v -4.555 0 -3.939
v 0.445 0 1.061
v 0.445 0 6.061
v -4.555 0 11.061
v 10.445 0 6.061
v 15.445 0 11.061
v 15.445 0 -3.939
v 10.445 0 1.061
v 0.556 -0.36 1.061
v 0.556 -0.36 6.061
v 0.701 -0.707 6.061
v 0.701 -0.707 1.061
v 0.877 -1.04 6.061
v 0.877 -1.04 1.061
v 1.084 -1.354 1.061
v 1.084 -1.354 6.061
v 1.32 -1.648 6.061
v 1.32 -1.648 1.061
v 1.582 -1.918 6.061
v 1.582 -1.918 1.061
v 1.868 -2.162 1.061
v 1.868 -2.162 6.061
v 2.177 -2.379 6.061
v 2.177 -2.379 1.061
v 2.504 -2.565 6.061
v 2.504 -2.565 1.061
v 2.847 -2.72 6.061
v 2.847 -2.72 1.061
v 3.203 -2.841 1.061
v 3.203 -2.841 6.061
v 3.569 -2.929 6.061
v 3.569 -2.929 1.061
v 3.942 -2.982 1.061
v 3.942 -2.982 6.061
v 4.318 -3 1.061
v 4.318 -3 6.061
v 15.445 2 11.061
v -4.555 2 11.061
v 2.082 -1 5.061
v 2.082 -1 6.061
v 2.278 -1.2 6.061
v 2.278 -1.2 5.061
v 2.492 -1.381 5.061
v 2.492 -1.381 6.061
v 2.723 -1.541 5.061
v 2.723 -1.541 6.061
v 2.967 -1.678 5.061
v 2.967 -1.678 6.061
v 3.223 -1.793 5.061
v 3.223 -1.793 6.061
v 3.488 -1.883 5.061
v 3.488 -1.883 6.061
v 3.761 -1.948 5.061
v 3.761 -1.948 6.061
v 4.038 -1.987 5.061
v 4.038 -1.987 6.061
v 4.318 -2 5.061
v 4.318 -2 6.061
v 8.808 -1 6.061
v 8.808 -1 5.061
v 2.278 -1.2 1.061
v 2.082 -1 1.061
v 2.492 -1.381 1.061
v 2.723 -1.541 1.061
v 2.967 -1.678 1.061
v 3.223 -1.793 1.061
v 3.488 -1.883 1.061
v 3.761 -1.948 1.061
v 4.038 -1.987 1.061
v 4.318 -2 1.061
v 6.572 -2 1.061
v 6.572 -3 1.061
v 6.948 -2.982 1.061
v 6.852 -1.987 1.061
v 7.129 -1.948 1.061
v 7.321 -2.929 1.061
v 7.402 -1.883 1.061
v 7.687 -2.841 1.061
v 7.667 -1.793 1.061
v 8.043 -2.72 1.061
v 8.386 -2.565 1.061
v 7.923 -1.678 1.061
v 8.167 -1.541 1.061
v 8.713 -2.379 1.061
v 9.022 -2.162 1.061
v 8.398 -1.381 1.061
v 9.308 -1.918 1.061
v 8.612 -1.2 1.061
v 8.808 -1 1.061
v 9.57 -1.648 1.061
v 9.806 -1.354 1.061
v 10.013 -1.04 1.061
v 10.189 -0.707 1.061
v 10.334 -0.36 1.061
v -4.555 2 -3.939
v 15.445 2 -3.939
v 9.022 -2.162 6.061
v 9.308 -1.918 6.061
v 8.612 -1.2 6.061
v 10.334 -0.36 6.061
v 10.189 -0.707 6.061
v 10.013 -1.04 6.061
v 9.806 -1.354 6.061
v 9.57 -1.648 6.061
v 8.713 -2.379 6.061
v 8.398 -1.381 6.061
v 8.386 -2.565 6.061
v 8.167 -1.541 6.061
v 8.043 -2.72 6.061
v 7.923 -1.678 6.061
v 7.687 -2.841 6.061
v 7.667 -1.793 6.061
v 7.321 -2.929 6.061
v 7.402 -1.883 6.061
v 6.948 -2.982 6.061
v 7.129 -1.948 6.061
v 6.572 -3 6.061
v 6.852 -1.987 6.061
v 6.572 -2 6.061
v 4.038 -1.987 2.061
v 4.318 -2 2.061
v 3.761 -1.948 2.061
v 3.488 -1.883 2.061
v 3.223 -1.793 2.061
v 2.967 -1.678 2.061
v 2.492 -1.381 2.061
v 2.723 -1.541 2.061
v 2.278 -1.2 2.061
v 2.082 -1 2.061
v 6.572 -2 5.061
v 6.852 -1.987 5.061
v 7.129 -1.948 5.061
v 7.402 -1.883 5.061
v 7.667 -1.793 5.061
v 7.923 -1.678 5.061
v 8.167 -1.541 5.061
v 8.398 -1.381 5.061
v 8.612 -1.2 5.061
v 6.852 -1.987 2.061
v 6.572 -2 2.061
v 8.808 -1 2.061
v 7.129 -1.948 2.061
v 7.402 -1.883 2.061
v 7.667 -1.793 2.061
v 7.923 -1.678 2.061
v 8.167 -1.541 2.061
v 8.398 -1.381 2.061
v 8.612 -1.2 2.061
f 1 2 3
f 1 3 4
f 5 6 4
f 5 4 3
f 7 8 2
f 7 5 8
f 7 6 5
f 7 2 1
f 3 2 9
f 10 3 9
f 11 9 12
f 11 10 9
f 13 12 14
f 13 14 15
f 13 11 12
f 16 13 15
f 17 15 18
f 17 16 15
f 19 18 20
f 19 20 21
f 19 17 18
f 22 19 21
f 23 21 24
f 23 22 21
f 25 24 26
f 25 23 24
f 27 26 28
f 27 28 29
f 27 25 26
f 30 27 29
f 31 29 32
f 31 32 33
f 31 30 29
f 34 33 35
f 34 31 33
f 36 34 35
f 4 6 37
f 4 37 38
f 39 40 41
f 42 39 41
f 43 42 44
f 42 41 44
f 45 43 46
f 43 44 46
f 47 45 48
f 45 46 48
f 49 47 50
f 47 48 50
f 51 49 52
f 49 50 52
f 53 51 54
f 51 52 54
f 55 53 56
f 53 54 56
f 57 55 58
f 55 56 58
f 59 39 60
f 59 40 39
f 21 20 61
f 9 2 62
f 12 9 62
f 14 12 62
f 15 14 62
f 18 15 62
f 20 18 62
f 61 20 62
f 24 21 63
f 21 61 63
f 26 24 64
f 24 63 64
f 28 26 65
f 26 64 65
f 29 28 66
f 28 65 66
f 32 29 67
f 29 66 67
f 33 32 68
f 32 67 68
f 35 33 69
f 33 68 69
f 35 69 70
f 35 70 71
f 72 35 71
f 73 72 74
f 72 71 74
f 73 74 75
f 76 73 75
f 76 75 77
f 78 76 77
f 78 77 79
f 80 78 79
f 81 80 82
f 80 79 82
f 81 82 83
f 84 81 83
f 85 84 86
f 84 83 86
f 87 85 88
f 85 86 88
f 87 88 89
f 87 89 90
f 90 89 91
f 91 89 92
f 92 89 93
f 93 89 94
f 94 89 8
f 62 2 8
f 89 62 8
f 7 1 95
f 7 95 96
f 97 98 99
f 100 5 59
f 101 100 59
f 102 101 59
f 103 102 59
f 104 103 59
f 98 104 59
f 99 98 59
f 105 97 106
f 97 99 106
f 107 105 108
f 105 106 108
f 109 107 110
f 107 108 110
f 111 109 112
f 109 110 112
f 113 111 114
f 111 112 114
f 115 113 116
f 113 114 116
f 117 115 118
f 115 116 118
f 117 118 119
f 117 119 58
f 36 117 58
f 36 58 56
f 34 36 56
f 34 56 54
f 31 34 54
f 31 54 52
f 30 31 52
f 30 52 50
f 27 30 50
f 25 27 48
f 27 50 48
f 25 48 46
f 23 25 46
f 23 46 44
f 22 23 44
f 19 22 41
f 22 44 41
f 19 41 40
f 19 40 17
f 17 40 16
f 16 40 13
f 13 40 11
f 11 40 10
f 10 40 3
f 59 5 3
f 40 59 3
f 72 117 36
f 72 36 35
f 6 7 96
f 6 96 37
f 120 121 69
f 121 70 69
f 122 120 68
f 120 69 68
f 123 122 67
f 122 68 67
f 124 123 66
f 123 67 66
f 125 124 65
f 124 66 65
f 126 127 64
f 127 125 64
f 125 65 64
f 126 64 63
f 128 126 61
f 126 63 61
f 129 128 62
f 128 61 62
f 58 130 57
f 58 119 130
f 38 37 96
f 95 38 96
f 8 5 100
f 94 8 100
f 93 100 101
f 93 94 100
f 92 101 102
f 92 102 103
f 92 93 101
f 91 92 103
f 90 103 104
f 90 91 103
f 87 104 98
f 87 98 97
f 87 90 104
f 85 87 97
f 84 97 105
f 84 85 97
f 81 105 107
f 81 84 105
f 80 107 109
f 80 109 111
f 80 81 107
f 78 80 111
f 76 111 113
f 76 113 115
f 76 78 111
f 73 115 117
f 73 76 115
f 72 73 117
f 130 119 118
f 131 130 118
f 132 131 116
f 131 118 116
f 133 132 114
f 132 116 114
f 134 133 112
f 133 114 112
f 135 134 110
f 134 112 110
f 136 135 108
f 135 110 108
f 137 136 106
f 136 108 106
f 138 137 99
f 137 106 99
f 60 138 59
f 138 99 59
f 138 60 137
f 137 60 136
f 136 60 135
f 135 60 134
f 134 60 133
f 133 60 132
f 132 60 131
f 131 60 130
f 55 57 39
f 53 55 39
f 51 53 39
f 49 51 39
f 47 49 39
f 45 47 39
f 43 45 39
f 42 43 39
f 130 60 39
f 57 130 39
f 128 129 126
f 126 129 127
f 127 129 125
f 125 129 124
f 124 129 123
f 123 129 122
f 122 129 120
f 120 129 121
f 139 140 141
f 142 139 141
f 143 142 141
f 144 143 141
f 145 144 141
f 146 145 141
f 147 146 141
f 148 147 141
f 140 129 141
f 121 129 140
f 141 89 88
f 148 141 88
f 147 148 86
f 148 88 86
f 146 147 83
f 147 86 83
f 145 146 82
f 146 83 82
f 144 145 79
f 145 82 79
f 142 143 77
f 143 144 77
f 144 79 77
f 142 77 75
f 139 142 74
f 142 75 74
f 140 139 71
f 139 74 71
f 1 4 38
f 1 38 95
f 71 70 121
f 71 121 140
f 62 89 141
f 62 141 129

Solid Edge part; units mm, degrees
sketch "Sketch1" plane through (4.7659, 0, 3.5606) normal (0, -1, 0) x (1, 0, 0)
  line L0 (10.6791, 7.5) -> (-9.3209, 7.5)
  line L1 (-9.3209, 7.5) -> (-9.3209, -7.5)
  line L2 (-9.3209, -7.5) -> (10.6791, -7.5)
  line L3 (10.6791, -7.5) -> (10.6791, 7.5)
extrude "Protrusion1" add sketch "Sketch1" against normal blind 2
sketch "Sketch2" plane through (0, 0, 0) normal (0, -1, 0) x (1, 0, 0)
  line L0 (10.445, 6.0606) -> (0.445, 6.0606)
  line L1 (0.445, 6.0606) -> (0.445, 1.0606)
  line L2 (0.445, 1.0606) -> (10.445, 1.0606)
  line L3 (10.445, 1.0606) -> (10.445, 6.0606)
extrude "Protrusion2" add sketch "Sketch2" along normal blind 3
fillet "Round_2" radius 4 2 edges at (10.445, -3, 3.5606) (0.445, -3, 3.5606)
sketch "Sketch3" plane through (5.445, -1.5, 1.0606) normal (0, 0, -1) x (1, 0, 0)
  line L0 (-1.127, 0.5) -> (1.127, 0.5)
  arc A0 (1.127, 0.5) -> (3.3631, -0.5) centre (1.127, -2.5) cw
  line L1 (3.3631, -0.5) -> (-3.3631, -0.5)
  arc A1 (-3.3631, -0.5) -> (-1.127, 0.5) centre (-1.127, -2.5) cw
  dimension "D1" = 1
extrude "ExtrudedCutout_1" cut sketch "Sketch3" against normal blind 1
sketch "Sketch4" plane through (5.445, -1.5, 6.0606) normal (0, 0, 1) x (1, 0, 0)
  line L0 (1.127, -0.5) -> (-1.127, -0.5)
  arc A0 (-1.127, -0.5) -> (-3.3631, 0.5) centre (-1.127, 2.5) cw
  line L1 (-3.3631, 0.5) -> (3.3631, 0.5)
  arc A1 (3.3631, 0.5) -> (1.127, -0.5) centre (1.127, 2.5) cw
  dimension "D1" = 1
extrude "ExtrudedCutout_2" cut sketch "Sketch4" against normal blind 1
